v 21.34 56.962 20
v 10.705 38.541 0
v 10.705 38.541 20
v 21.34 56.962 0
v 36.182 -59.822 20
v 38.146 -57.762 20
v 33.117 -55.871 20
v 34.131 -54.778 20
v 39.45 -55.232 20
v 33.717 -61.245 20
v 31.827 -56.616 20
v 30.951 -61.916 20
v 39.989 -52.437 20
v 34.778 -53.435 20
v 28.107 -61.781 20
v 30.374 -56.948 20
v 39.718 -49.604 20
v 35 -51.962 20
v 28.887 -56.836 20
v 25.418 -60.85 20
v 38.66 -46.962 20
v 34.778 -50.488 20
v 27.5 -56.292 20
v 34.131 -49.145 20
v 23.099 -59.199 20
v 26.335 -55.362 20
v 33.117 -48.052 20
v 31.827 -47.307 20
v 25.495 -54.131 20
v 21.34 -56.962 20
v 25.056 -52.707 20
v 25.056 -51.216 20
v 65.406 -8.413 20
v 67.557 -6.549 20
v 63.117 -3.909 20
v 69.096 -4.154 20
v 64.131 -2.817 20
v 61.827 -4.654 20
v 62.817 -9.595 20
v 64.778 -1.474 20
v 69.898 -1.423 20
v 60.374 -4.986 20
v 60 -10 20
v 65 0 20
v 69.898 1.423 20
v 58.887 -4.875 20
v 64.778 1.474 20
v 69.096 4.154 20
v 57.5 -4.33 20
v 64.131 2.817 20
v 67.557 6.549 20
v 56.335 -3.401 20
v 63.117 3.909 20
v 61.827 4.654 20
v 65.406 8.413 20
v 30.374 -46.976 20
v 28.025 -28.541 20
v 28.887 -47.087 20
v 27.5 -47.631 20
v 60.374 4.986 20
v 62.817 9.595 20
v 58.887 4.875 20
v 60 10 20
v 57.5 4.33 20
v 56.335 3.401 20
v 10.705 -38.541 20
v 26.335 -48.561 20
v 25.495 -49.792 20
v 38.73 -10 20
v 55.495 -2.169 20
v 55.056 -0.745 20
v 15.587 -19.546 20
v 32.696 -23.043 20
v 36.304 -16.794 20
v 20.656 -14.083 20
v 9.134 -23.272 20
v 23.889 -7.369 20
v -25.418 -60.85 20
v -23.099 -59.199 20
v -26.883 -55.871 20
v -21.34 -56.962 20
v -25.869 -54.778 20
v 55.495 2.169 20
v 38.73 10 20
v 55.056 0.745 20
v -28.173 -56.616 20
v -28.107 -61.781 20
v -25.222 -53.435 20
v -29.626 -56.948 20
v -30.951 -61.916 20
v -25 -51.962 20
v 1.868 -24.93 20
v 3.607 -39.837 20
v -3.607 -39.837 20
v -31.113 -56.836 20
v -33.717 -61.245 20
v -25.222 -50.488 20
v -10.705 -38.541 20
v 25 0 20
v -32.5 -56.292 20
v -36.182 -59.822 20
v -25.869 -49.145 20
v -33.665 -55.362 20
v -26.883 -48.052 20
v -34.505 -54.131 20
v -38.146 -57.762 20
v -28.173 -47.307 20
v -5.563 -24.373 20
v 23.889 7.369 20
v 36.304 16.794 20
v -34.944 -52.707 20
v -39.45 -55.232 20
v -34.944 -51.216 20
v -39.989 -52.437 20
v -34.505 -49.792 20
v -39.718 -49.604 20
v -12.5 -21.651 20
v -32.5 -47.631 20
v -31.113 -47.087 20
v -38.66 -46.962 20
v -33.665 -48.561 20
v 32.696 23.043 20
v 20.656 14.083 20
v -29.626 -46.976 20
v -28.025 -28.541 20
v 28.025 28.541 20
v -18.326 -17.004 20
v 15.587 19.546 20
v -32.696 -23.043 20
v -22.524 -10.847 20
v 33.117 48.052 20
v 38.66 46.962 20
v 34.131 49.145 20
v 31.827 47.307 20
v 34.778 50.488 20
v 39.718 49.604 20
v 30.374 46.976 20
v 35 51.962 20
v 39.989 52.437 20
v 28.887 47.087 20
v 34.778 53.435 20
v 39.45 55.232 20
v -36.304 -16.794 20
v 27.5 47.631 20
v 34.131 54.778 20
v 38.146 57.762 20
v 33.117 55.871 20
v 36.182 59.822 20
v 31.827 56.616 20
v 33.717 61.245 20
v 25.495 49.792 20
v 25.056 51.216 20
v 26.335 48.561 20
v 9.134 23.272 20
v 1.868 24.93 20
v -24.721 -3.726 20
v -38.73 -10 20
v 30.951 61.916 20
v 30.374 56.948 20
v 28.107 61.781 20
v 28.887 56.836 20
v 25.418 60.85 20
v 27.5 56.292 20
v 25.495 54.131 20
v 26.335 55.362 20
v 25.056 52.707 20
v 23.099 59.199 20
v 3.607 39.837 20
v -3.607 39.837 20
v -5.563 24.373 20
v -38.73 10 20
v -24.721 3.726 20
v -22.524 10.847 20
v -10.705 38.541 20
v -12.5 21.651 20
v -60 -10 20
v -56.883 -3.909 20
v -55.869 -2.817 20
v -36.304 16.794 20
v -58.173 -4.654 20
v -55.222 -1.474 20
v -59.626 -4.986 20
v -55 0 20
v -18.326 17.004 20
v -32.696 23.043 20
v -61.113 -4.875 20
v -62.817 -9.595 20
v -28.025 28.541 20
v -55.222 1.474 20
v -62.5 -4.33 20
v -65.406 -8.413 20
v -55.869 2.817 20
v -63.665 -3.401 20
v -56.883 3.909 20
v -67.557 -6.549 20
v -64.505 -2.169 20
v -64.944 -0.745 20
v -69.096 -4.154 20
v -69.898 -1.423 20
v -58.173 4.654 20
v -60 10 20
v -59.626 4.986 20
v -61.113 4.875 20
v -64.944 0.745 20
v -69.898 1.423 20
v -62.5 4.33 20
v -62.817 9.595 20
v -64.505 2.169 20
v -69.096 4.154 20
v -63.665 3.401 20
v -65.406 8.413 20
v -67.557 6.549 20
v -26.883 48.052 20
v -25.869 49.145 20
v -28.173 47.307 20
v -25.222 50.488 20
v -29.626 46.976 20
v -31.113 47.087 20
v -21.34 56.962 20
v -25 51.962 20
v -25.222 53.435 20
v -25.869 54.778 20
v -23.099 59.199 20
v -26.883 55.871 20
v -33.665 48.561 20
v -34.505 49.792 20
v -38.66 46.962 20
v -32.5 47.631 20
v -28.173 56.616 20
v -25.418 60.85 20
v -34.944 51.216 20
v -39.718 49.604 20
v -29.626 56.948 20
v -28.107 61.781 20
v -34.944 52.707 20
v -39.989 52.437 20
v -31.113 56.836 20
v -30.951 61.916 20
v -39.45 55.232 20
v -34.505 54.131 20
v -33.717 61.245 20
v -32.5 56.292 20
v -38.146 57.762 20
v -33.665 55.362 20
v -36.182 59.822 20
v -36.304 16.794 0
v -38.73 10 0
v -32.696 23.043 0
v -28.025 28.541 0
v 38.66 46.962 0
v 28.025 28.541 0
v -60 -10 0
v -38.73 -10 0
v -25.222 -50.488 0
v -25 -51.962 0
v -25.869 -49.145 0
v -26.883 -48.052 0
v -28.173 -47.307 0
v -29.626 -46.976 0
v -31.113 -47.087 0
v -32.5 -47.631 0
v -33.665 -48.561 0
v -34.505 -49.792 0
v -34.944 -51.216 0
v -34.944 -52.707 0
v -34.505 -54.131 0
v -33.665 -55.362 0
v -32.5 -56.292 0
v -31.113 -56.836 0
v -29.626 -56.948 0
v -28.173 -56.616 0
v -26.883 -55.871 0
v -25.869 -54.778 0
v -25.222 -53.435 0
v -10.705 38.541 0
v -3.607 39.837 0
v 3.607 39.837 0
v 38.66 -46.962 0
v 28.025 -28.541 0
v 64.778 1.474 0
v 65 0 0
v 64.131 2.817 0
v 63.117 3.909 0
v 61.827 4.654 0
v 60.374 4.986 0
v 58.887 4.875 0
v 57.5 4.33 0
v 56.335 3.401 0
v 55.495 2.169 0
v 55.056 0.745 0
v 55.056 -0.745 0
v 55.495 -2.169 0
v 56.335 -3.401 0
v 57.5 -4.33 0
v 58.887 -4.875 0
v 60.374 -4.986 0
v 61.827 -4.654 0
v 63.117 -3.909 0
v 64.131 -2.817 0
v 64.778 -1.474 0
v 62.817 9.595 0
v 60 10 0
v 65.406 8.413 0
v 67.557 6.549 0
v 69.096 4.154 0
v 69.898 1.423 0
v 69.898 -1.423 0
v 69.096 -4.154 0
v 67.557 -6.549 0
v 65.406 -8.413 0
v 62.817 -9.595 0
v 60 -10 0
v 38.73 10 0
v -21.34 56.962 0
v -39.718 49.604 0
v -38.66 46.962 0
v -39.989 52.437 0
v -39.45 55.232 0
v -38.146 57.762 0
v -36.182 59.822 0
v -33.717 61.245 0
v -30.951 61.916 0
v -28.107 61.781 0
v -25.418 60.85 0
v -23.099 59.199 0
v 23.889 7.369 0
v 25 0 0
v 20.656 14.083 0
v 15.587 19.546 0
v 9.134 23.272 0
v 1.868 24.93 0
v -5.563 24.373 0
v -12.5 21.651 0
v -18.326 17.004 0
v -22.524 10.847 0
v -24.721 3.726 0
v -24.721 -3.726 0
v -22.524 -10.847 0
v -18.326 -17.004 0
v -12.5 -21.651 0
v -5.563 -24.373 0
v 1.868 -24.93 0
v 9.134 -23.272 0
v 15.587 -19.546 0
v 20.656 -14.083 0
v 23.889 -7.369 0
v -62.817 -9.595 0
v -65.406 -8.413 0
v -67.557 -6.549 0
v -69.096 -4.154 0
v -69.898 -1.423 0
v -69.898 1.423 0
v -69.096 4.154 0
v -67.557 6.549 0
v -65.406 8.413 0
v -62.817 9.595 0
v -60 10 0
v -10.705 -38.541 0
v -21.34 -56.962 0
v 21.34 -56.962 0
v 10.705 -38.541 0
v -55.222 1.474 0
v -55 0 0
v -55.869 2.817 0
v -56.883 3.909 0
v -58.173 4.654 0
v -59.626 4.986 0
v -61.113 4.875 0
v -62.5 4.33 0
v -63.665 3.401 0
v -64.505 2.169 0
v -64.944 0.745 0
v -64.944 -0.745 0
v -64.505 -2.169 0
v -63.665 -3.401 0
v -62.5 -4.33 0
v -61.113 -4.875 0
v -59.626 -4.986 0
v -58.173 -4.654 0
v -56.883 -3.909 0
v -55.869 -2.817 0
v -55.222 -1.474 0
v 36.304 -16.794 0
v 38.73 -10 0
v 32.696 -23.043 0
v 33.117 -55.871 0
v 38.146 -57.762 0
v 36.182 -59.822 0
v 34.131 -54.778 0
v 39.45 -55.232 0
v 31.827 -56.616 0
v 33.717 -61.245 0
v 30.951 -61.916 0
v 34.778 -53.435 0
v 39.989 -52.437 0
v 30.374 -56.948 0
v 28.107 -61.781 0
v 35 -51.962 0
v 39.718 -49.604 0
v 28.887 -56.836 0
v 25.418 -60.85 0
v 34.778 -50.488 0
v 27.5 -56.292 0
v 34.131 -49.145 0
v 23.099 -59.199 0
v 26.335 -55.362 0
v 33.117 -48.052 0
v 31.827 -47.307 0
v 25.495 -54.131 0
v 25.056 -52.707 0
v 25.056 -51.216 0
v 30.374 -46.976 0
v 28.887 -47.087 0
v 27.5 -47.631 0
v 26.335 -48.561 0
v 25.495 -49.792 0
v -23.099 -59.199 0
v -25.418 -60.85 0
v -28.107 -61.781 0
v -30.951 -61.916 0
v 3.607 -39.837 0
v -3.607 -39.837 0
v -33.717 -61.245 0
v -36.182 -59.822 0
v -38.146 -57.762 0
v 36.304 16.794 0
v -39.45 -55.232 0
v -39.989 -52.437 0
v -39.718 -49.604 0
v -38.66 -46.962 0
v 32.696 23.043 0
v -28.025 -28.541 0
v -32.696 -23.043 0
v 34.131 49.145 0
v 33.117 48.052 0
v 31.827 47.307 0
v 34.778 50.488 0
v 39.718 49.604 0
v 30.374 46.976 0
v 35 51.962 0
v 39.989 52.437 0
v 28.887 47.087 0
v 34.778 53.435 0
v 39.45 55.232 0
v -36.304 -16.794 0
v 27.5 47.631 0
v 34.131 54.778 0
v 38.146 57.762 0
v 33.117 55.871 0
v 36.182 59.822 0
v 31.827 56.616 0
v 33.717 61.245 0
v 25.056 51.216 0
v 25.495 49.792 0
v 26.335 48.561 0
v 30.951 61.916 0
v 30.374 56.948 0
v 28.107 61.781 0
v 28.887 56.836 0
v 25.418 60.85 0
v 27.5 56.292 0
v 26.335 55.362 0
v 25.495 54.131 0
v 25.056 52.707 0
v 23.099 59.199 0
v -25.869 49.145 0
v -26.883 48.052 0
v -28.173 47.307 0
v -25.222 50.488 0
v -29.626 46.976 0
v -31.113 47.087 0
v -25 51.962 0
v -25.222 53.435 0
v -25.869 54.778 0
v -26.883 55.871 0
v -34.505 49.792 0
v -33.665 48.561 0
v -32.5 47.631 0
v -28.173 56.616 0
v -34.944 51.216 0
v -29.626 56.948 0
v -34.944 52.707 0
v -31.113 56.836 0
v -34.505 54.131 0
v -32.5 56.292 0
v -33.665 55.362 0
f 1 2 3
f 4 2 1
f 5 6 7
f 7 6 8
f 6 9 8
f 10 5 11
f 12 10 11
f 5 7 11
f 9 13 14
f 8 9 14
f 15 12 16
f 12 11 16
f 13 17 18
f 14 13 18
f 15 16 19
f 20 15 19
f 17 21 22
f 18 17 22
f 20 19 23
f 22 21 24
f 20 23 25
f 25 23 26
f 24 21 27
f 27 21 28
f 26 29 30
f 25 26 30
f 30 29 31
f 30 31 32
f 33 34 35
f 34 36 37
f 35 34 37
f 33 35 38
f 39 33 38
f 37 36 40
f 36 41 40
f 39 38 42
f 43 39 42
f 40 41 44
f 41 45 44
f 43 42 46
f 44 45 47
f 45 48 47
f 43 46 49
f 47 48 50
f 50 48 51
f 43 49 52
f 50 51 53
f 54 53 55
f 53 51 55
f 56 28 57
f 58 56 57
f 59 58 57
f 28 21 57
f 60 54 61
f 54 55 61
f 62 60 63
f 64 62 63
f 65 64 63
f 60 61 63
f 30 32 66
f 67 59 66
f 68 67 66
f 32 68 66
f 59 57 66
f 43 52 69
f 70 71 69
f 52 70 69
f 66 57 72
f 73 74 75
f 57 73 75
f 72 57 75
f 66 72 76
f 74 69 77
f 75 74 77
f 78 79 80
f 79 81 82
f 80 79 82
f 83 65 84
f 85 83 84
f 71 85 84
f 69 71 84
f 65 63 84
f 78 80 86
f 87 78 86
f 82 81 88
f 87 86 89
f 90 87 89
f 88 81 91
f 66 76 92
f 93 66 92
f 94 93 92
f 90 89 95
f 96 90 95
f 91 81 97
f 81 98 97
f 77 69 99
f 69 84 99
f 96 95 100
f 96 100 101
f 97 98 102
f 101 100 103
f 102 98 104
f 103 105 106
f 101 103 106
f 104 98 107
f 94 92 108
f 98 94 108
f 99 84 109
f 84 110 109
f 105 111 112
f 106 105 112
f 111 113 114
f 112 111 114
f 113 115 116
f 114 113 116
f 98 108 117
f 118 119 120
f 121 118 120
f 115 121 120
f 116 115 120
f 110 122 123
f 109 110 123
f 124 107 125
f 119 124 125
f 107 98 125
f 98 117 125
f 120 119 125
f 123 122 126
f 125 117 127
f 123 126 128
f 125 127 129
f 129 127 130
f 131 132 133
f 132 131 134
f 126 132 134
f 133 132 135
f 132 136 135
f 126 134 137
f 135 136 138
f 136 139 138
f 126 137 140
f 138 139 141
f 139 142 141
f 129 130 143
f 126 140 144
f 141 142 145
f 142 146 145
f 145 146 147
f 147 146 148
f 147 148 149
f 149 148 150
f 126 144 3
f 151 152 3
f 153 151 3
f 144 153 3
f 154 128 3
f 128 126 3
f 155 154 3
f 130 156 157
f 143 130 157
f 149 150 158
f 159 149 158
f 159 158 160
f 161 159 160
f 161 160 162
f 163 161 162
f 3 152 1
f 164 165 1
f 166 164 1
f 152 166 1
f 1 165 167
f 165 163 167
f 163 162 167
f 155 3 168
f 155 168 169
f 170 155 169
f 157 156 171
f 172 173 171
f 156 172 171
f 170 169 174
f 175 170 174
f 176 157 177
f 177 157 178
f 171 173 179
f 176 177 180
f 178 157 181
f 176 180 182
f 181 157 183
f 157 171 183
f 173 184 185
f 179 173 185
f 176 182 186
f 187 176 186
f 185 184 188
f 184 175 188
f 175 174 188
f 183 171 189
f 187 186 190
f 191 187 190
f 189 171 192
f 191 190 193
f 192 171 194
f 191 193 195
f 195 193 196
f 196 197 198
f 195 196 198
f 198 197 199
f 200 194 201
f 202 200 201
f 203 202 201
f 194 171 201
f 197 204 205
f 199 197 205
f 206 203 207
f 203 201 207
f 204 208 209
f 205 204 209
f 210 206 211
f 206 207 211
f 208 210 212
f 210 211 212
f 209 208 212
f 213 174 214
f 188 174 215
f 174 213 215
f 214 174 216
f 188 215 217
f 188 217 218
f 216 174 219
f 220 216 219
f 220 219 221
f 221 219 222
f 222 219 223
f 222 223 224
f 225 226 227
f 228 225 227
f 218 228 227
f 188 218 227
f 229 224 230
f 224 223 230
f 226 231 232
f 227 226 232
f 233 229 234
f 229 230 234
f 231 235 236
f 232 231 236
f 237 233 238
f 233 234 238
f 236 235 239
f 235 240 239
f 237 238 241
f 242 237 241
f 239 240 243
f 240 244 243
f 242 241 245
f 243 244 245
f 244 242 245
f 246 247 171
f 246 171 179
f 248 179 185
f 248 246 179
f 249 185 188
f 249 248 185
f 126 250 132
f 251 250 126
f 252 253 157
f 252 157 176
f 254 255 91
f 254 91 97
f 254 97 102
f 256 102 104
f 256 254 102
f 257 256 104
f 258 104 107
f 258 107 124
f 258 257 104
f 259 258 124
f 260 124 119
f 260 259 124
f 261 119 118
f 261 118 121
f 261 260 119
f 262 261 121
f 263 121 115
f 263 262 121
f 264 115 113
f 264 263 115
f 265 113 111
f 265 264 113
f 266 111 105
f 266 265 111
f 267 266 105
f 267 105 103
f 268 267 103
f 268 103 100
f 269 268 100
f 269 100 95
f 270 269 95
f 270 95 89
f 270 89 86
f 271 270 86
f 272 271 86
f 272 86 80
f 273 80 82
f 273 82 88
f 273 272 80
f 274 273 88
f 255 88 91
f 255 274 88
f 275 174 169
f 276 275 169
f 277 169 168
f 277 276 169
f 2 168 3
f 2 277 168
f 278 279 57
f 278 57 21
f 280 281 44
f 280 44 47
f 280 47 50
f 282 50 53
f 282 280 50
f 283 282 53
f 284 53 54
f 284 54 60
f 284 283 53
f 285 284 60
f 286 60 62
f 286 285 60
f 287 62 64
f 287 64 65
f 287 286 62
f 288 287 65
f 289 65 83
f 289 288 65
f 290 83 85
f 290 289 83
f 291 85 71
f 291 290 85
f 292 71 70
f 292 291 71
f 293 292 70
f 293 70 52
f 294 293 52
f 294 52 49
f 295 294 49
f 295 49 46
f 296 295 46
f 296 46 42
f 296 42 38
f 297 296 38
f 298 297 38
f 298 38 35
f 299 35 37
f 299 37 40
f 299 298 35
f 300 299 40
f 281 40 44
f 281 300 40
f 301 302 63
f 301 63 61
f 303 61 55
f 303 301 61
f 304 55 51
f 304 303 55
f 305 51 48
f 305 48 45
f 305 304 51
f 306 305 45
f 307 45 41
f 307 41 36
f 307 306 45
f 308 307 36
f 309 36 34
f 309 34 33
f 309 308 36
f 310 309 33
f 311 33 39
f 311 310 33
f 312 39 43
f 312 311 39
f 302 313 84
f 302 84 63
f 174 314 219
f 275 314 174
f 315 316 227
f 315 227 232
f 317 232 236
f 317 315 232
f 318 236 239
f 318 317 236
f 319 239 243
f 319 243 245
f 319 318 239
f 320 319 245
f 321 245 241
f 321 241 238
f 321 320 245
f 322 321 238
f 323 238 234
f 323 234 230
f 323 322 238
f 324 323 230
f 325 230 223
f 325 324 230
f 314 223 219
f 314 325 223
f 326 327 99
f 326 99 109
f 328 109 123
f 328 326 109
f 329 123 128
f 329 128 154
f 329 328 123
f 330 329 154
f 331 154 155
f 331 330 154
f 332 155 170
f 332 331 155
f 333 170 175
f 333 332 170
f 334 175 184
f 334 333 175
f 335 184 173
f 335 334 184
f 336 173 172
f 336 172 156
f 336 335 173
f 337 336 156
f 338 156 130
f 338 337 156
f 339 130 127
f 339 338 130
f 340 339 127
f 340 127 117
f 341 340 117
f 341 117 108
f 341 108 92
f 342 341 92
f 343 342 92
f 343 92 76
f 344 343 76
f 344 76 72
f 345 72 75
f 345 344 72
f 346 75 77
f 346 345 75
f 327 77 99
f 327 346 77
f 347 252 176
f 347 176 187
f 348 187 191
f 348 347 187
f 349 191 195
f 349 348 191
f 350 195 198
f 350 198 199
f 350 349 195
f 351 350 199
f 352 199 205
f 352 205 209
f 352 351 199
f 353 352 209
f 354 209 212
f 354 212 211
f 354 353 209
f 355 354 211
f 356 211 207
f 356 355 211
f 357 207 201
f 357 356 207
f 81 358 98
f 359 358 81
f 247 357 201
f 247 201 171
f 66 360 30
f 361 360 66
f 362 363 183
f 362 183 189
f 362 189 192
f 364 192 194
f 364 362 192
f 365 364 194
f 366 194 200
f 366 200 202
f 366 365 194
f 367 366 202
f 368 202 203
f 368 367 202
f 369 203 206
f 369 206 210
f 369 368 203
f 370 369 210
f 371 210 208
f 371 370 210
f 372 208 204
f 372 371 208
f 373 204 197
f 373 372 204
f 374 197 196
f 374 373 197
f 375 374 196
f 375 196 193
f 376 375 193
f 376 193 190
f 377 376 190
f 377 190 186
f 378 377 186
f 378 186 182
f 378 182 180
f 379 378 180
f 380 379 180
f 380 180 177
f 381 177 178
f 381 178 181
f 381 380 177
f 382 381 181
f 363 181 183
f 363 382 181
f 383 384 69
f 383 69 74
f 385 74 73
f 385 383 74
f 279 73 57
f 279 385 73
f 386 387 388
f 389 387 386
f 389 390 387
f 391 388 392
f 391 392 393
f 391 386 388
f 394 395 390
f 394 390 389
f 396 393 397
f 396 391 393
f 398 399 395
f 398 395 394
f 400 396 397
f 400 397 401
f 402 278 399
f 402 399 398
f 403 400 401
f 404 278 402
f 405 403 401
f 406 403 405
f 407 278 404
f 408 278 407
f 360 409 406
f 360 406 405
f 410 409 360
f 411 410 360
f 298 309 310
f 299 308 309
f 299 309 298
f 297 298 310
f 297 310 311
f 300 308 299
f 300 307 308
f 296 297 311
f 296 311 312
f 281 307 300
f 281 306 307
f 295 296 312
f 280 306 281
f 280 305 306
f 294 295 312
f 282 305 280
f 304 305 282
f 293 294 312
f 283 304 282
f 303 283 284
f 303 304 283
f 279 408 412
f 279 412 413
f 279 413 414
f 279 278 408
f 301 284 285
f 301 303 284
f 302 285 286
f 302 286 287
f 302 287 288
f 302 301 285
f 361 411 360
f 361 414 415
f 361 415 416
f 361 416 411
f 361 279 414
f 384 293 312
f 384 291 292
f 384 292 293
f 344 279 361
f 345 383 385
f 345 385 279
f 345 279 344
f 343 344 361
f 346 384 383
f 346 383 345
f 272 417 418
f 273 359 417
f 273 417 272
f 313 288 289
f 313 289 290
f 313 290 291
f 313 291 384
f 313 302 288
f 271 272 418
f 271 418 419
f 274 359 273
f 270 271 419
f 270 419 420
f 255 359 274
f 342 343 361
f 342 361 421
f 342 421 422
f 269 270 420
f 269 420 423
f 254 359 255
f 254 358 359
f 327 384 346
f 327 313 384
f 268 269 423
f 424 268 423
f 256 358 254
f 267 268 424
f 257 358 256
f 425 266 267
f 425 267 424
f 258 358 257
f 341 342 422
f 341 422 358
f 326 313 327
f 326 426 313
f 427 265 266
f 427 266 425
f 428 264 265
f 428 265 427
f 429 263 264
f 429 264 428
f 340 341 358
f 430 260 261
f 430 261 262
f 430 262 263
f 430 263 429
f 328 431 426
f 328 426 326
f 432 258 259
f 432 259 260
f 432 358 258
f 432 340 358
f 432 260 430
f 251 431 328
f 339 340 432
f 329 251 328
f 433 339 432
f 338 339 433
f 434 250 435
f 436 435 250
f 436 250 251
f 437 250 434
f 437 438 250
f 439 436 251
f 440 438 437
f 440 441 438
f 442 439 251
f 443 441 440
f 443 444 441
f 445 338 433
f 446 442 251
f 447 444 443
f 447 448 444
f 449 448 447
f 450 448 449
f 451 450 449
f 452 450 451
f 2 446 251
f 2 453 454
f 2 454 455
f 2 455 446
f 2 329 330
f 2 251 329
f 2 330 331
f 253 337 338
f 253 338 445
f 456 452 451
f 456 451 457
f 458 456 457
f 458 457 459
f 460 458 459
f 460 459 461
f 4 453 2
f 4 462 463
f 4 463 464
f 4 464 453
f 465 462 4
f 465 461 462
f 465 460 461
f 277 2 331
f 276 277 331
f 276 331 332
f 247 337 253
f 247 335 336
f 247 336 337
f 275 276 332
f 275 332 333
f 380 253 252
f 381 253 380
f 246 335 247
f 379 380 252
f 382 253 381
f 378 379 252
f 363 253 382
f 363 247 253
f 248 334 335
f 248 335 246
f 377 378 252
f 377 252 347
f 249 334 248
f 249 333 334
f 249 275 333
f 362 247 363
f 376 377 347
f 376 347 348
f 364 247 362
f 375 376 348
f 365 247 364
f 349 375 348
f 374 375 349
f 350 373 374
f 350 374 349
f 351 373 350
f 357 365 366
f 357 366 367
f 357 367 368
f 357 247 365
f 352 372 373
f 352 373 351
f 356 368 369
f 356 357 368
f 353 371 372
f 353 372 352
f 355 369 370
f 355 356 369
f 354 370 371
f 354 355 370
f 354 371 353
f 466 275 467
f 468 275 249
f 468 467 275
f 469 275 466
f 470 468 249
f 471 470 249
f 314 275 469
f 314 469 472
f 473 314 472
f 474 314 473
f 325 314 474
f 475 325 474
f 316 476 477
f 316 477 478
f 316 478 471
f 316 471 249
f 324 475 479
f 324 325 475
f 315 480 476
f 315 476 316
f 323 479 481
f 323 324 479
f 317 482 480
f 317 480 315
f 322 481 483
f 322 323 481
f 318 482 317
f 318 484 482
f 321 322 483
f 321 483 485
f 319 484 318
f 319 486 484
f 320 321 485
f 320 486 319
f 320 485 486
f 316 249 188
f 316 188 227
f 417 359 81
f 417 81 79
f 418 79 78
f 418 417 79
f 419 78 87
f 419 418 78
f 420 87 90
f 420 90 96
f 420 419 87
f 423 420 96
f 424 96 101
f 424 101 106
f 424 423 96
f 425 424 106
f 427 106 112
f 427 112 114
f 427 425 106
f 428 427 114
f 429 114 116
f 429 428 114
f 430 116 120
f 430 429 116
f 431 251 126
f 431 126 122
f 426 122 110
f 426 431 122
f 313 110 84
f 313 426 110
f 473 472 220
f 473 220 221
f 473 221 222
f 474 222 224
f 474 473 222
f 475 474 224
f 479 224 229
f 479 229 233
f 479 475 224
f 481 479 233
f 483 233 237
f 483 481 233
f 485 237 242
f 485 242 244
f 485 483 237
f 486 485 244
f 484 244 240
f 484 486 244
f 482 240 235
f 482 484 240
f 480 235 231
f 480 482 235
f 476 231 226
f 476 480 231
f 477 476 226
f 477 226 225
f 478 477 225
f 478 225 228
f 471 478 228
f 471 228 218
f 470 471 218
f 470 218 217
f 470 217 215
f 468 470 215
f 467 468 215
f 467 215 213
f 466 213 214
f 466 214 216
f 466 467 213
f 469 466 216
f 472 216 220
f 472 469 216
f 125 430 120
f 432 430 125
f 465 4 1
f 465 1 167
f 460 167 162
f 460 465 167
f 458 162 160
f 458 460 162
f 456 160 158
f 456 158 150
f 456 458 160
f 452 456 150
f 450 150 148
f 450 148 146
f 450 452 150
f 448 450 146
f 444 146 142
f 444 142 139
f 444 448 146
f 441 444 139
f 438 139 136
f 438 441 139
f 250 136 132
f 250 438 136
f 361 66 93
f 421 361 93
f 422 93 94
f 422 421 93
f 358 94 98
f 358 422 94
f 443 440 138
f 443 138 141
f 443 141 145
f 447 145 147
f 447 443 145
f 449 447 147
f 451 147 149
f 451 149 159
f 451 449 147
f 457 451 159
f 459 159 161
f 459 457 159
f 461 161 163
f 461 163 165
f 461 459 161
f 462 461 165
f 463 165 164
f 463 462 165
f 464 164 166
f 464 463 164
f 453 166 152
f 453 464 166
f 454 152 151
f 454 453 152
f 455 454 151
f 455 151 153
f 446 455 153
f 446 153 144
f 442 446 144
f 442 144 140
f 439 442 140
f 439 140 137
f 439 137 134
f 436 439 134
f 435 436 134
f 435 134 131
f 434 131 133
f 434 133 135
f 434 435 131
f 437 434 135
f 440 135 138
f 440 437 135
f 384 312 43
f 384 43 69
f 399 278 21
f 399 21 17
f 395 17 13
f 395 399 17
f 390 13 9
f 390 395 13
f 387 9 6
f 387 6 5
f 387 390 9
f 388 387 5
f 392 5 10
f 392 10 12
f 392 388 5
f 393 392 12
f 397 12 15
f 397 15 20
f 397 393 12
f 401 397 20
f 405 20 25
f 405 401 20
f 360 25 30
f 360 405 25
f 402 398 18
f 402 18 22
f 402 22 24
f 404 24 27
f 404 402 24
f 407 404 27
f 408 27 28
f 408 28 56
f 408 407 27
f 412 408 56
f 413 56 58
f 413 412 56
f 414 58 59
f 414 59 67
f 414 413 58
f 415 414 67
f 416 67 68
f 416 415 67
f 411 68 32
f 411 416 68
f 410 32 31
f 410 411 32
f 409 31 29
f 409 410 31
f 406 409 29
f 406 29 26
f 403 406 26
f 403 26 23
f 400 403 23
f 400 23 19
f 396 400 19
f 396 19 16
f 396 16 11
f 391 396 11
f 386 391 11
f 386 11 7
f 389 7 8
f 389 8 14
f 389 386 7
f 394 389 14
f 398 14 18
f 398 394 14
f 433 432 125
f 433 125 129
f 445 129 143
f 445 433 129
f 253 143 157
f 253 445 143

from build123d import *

# Parameters (mm, degrees)
SKETCH1_R           = 25
SKETCH1_R_2         = 5
BOSS_EXTRUDE1_DEPTH = 20


with BuildPart() as part:
    # Sketch1 → Boss-Extrude1 (new body)
    with BuildSketch(Plane.XY):
        with BuildLine():
            Line((-60, 10), (-38.729833462, 10))
            ThreePointArc((-38.729833462, 10), (-34.641016151, 20), (-28.025170769, 28.541019662))
            Line((-28.025170769, 28.541019662), (-38.660254038, 46.961524227))
            ThreePointArc((-38.660254038, 46.961524227), (-35, 60.621778265), (-21.339745962, 56.961524227))
            Line((-21.339745962, 56.961524227), (-10.704662693, 38.541019662))
            ThreePointArc((-10.704662693, 38.541019662), (0, 40), (10.704662693, 38.541019662))
            Line((10.704662693, 38.541019662), (21.339745962, 56.961524227))
            ThreePointArc((21.339745962, 56.961524227), (35, 60.621778265), (38.660254038, 46.961524227))
            Line((38.660254038, 46.961524227), (28.025170769, 28.541019662))
            ThreePointArc((28.025170769, 28.541019662), (34.641016151, 20), (38.729833462, 10))
            Line((38.729833462, 10), (60, 10))
            ThreePointArc((60, 10), (70, 0), (60, -10))
            Line((60, -10), (38.729833462, -10))
            ThreePointArc((38.729833462, -10), (34.641016151, -20), (28.025170769, -28.541019662))
            Line((28.025170769, -28.541019662), (38.660254038, -46.961524227))
            ThreePointArc((38.660254038, -46.961524227), (35, -60.621778265), (21.339745962, -56.961524227))
            Line((21.339745962, -56.961524227), (10.704662693, -38.541019662))
            ThreePointArc((10.704662693, -38.541019662), (0, -40), (-10.704662693, -38.541019662))
            Line((-10.704662693, -38.541019662), (-21.339745962, -56.961524227))
            ThreePointArc((-21.339745962, -56.961524227), (-35, -60.621778265), (-38.660254038, -46.961524227))
            Line((-38.660254038, -46.961524227), (-28.025170769, -28.541019662))
            ThreePointArc((-28.025170769, -28.541019662), (-34.641016151, -20), (-38.729833462, -10))
            Line((-38.729833462, -10), (-60, -10))
            ThreePointArc((-60, -10), (-70, 0), (-60, 10))
        make_face()
        Circle(SKETCH1_R, mode=Mode.SUBTRACT)
        with Locations((-60, 0)):
            Circle(SKETCH1_R_2, mode=Mode.SUBTRACT)
        with Locations((-30, 51.961524227)):
            Circle(SKETCH1_R_2, mode=Mode.SUBTRACT)
        with Locations((30, 51.961524227)):
            Circle(SKETCH1_R_2, mode=Mode.SUBTRACT)
        with Locations((60, 0)):
            Circle(SKETCH1_R_2, mode=Mode.SUBTRACT)
        with Locations((30, -51.961524227)):
            Circle(SKETCH1_R_2, mode=Mode.SUBTRACT)
        with Locations((-30, -51.961524227)):
            Circle(SKETCH1_R_2, mode=Mode.SUBTRACT)
    extrude(amount=BOSS_EXTRUDE1_DEPTH)


solid = part.part
